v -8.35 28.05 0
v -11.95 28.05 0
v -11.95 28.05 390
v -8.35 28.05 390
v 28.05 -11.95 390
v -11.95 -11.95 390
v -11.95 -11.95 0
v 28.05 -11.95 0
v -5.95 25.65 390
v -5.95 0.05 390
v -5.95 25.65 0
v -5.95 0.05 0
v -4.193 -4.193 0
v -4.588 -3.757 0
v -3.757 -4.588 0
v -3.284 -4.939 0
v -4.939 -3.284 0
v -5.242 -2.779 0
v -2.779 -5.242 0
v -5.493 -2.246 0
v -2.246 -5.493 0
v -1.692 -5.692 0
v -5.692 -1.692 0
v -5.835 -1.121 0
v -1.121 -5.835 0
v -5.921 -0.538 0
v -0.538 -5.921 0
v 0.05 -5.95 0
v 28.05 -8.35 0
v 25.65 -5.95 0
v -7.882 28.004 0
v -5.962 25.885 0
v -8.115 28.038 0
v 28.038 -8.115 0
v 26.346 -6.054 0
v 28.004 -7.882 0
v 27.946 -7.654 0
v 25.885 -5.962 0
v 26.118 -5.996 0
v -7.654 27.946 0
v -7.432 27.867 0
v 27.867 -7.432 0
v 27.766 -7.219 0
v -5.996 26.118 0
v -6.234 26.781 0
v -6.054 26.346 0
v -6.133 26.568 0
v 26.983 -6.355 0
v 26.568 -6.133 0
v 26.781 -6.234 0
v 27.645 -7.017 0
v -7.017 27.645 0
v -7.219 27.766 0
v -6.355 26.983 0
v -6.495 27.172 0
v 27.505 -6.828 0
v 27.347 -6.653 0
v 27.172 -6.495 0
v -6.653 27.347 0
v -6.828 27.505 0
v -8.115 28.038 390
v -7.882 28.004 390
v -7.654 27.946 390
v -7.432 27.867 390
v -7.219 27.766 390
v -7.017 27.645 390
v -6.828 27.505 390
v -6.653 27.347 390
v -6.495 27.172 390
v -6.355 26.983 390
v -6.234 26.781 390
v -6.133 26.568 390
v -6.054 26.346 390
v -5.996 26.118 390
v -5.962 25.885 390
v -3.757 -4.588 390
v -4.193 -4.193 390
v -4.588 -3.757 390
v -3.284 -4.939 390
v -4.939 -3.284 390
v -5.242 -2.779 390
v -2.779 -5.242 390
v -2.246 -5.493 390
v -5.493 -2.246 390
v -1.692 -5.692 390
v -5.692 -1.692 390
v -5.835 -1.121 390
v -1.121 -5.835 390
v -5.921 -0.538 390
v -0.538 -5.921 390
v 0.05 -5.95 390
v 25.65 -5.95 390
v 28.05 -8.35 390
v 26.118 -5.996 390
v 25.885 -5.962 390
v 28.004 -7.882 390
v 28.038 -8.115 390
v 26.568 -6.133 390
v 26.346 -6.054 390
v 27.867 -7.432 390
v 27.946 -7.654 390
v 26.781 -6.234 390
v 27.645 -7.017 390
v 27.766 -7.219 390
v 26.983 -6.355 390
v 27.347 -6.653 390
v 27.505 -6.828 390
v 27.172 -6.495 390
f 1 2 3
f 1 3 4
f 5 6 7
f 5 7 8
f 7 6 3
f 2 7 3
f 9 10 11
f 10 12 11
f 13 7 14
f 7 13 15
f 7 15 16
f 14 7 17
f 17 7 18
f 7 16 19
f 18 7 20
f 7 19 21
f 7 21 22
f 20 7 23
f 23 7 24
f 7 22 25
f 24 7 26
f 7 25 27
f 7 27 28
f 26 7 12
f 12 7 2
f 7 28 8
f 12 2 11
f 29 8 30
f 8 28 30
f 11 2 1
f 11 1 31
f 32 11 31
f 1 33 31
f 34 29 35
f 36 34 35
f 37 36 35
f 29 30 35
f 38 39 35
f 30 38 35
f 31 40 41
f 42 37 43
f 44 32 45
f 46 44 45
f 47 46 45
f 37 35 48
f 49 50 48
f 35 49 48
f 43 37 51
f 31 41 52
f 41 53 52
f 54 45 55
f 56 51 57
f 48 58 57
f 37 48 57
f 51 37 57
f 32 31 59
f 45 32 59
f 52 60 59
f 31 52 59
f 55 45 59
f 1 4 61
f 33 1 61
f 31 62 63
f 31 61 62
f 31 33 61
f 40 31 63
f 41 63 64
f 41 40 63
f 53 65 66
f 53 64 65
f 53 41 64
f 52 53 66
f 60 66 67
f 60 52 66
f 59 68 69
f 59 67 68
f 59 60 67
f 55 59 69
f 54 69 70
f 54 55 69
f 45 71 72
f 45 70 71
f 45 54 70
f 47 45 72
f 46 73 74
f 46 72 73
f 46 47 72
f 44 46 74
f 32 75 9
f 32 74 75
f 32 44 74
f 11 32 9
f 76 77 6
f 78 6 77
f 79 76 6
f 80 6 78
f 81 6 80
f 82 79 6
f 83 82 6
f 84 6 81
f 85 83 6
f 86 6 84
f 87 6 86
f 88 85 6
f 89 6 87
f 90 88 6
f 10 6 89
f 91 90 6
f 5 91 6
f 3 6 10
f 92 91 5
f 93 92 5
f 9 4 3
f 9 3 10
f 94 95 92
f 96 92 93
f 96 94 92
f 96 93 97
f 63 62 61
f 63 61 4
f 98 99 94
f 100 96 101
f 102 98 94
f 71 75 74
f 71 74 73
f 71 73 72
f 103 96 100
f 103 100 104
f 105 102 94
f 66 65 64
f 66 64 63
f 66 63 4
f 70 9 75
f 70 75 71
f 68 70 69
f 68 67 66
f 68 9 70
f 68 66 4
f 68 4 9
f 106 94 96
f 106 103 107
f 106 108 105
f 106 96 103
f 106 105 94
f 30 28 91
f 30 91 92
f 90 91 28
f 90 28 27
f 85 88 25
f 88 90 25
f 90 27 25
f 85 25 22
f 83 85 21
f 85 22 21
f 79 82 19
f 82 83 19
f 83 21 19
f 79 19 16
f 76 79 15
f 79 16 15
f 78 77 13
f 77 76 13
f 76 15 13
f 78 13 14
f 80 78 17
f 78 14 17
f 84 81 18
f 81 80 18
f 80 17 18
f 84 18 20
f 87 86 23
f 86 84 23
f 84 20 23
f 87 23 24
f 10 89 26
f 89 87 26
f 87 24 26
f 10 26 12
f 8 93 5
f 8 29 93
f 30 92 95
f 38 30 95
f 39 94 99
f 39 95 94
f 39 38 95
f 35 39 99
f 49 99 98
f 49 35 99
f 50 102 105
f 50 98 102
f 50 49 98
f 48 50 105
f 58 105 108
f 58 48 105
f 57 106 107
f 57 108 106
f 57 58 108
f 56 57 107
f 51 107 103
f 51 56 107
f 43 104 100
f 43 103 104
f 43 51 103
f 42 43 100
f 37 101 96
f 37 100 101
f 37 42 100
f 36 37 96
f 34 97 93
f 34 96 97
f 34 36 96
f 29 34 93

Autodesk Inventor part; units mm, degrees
ref_plane "YZ Plane" through (0, 0, 0) normal (1, 0, 0) x (0, 1, 0)
ref_plane "Start Plane" through (0, 0, 0) normal (0, 0, 1) x (1, 0, 0)
ref_plane "End Plane" through (0, 0, 390) normal (0, 0, 1) x (1, 0, 0)
sketch "Sketch" plane through (0, 0, 0) normal (0, 0, 1) x (1, 0, 0)
  line L0 (-5.9502, 0.0498) -> (-5.9502, 25.6498)
  line L1 (-11.9502, 28.0498) -> (-8.3502, 28.0498)
  line L2 (-11.9502, -11.9502) -> (-11.9502, 28.0498)
  line L3 (-11.9502, -11.9502) -> (28.0498, -11.9502)
  line L4 (28.0498, -8.3502) -> (28.0498, -11.9502)
  line L5 (0.0498, -5.9502) -> (25.6498, -5.9502)
  arc A0 (-5.9502, 0.0498) -> (0.0498, -5.9502) centre (0.0498, 0.0498) ccw
  arc A1 (-5.9502, 25.6498) -> (-8.3502, 28.0498) centre (-8.3502, 25.6498) ccw
  arc A2 (28.0498, -8.3502) -> (25.6498, -5.9502) centre (25.6498, -8.3502) ccw
  line L6 (0, 36.6463) -> (0, -20.0496) construction
  line L7 (-20.0496, 0) -> (36.6463, 0) construction
  point P0 (-5.9502, -5.9502)
  point P1 (-5.9502, 28.0498)
  point P2 (28.0498, -5.9502)
  dimension "d4" = 40
  dimension "d6" = 40
  dimension "d8" = 6
  dimension "d10" = 6
  dimension "d17" = 6
  dimension "d18" = 2.4
  dimension "d19" = 11.9502
  dimension "d20" = 11.9502
extrude "Body" add sketch "Sketch" along normal up to surface (390 mm away) from surface at 0
sketch "Sketch3" plane through (0, 0, 0) normal (0, 0, 1) x (1, 0, 0)
  line L0 (0, 0) -> (10, 0)
ref_plane "Work Plane10" through (0, 0, 0) normal (0, -1, 0) x (1, 0, 0)
sketch "Sketch4" plane through (0, 0, 0) normal (0, -1, 0) x (1, 0, 0)
  line L0 (-2, 0) -> (12, 0)
  line L1 (-2, 390) -> (12, 390)
  dimension "d24" = 390
equation "\"d4\" = b"
equation "\"d6\" = b"
equation "\"d8\" = ParT"
equation "\"d10\" = ParT"
equation "\"d17\" = R"
equation "\"d18\" = R1"
equation "\"d19\" = ex"
equation "\"d20\" = d19"
equation "\"d11\" = G_L"
equation "\"b\" = 40"
equation "\"ParT\" = 6"
equation "\"R\" = 6"
equation "\"R1\" = 2.4"
equation "\"G_L\" = d24"
equation "\"G_OFFSET_START\" = 0"
equation "\"G_OFFSET_END\" = 0"
equation "\"ex\" = 11.950185"
properties part number "BS 4848 - 40x40x6-390" material "Steel, Mild"
